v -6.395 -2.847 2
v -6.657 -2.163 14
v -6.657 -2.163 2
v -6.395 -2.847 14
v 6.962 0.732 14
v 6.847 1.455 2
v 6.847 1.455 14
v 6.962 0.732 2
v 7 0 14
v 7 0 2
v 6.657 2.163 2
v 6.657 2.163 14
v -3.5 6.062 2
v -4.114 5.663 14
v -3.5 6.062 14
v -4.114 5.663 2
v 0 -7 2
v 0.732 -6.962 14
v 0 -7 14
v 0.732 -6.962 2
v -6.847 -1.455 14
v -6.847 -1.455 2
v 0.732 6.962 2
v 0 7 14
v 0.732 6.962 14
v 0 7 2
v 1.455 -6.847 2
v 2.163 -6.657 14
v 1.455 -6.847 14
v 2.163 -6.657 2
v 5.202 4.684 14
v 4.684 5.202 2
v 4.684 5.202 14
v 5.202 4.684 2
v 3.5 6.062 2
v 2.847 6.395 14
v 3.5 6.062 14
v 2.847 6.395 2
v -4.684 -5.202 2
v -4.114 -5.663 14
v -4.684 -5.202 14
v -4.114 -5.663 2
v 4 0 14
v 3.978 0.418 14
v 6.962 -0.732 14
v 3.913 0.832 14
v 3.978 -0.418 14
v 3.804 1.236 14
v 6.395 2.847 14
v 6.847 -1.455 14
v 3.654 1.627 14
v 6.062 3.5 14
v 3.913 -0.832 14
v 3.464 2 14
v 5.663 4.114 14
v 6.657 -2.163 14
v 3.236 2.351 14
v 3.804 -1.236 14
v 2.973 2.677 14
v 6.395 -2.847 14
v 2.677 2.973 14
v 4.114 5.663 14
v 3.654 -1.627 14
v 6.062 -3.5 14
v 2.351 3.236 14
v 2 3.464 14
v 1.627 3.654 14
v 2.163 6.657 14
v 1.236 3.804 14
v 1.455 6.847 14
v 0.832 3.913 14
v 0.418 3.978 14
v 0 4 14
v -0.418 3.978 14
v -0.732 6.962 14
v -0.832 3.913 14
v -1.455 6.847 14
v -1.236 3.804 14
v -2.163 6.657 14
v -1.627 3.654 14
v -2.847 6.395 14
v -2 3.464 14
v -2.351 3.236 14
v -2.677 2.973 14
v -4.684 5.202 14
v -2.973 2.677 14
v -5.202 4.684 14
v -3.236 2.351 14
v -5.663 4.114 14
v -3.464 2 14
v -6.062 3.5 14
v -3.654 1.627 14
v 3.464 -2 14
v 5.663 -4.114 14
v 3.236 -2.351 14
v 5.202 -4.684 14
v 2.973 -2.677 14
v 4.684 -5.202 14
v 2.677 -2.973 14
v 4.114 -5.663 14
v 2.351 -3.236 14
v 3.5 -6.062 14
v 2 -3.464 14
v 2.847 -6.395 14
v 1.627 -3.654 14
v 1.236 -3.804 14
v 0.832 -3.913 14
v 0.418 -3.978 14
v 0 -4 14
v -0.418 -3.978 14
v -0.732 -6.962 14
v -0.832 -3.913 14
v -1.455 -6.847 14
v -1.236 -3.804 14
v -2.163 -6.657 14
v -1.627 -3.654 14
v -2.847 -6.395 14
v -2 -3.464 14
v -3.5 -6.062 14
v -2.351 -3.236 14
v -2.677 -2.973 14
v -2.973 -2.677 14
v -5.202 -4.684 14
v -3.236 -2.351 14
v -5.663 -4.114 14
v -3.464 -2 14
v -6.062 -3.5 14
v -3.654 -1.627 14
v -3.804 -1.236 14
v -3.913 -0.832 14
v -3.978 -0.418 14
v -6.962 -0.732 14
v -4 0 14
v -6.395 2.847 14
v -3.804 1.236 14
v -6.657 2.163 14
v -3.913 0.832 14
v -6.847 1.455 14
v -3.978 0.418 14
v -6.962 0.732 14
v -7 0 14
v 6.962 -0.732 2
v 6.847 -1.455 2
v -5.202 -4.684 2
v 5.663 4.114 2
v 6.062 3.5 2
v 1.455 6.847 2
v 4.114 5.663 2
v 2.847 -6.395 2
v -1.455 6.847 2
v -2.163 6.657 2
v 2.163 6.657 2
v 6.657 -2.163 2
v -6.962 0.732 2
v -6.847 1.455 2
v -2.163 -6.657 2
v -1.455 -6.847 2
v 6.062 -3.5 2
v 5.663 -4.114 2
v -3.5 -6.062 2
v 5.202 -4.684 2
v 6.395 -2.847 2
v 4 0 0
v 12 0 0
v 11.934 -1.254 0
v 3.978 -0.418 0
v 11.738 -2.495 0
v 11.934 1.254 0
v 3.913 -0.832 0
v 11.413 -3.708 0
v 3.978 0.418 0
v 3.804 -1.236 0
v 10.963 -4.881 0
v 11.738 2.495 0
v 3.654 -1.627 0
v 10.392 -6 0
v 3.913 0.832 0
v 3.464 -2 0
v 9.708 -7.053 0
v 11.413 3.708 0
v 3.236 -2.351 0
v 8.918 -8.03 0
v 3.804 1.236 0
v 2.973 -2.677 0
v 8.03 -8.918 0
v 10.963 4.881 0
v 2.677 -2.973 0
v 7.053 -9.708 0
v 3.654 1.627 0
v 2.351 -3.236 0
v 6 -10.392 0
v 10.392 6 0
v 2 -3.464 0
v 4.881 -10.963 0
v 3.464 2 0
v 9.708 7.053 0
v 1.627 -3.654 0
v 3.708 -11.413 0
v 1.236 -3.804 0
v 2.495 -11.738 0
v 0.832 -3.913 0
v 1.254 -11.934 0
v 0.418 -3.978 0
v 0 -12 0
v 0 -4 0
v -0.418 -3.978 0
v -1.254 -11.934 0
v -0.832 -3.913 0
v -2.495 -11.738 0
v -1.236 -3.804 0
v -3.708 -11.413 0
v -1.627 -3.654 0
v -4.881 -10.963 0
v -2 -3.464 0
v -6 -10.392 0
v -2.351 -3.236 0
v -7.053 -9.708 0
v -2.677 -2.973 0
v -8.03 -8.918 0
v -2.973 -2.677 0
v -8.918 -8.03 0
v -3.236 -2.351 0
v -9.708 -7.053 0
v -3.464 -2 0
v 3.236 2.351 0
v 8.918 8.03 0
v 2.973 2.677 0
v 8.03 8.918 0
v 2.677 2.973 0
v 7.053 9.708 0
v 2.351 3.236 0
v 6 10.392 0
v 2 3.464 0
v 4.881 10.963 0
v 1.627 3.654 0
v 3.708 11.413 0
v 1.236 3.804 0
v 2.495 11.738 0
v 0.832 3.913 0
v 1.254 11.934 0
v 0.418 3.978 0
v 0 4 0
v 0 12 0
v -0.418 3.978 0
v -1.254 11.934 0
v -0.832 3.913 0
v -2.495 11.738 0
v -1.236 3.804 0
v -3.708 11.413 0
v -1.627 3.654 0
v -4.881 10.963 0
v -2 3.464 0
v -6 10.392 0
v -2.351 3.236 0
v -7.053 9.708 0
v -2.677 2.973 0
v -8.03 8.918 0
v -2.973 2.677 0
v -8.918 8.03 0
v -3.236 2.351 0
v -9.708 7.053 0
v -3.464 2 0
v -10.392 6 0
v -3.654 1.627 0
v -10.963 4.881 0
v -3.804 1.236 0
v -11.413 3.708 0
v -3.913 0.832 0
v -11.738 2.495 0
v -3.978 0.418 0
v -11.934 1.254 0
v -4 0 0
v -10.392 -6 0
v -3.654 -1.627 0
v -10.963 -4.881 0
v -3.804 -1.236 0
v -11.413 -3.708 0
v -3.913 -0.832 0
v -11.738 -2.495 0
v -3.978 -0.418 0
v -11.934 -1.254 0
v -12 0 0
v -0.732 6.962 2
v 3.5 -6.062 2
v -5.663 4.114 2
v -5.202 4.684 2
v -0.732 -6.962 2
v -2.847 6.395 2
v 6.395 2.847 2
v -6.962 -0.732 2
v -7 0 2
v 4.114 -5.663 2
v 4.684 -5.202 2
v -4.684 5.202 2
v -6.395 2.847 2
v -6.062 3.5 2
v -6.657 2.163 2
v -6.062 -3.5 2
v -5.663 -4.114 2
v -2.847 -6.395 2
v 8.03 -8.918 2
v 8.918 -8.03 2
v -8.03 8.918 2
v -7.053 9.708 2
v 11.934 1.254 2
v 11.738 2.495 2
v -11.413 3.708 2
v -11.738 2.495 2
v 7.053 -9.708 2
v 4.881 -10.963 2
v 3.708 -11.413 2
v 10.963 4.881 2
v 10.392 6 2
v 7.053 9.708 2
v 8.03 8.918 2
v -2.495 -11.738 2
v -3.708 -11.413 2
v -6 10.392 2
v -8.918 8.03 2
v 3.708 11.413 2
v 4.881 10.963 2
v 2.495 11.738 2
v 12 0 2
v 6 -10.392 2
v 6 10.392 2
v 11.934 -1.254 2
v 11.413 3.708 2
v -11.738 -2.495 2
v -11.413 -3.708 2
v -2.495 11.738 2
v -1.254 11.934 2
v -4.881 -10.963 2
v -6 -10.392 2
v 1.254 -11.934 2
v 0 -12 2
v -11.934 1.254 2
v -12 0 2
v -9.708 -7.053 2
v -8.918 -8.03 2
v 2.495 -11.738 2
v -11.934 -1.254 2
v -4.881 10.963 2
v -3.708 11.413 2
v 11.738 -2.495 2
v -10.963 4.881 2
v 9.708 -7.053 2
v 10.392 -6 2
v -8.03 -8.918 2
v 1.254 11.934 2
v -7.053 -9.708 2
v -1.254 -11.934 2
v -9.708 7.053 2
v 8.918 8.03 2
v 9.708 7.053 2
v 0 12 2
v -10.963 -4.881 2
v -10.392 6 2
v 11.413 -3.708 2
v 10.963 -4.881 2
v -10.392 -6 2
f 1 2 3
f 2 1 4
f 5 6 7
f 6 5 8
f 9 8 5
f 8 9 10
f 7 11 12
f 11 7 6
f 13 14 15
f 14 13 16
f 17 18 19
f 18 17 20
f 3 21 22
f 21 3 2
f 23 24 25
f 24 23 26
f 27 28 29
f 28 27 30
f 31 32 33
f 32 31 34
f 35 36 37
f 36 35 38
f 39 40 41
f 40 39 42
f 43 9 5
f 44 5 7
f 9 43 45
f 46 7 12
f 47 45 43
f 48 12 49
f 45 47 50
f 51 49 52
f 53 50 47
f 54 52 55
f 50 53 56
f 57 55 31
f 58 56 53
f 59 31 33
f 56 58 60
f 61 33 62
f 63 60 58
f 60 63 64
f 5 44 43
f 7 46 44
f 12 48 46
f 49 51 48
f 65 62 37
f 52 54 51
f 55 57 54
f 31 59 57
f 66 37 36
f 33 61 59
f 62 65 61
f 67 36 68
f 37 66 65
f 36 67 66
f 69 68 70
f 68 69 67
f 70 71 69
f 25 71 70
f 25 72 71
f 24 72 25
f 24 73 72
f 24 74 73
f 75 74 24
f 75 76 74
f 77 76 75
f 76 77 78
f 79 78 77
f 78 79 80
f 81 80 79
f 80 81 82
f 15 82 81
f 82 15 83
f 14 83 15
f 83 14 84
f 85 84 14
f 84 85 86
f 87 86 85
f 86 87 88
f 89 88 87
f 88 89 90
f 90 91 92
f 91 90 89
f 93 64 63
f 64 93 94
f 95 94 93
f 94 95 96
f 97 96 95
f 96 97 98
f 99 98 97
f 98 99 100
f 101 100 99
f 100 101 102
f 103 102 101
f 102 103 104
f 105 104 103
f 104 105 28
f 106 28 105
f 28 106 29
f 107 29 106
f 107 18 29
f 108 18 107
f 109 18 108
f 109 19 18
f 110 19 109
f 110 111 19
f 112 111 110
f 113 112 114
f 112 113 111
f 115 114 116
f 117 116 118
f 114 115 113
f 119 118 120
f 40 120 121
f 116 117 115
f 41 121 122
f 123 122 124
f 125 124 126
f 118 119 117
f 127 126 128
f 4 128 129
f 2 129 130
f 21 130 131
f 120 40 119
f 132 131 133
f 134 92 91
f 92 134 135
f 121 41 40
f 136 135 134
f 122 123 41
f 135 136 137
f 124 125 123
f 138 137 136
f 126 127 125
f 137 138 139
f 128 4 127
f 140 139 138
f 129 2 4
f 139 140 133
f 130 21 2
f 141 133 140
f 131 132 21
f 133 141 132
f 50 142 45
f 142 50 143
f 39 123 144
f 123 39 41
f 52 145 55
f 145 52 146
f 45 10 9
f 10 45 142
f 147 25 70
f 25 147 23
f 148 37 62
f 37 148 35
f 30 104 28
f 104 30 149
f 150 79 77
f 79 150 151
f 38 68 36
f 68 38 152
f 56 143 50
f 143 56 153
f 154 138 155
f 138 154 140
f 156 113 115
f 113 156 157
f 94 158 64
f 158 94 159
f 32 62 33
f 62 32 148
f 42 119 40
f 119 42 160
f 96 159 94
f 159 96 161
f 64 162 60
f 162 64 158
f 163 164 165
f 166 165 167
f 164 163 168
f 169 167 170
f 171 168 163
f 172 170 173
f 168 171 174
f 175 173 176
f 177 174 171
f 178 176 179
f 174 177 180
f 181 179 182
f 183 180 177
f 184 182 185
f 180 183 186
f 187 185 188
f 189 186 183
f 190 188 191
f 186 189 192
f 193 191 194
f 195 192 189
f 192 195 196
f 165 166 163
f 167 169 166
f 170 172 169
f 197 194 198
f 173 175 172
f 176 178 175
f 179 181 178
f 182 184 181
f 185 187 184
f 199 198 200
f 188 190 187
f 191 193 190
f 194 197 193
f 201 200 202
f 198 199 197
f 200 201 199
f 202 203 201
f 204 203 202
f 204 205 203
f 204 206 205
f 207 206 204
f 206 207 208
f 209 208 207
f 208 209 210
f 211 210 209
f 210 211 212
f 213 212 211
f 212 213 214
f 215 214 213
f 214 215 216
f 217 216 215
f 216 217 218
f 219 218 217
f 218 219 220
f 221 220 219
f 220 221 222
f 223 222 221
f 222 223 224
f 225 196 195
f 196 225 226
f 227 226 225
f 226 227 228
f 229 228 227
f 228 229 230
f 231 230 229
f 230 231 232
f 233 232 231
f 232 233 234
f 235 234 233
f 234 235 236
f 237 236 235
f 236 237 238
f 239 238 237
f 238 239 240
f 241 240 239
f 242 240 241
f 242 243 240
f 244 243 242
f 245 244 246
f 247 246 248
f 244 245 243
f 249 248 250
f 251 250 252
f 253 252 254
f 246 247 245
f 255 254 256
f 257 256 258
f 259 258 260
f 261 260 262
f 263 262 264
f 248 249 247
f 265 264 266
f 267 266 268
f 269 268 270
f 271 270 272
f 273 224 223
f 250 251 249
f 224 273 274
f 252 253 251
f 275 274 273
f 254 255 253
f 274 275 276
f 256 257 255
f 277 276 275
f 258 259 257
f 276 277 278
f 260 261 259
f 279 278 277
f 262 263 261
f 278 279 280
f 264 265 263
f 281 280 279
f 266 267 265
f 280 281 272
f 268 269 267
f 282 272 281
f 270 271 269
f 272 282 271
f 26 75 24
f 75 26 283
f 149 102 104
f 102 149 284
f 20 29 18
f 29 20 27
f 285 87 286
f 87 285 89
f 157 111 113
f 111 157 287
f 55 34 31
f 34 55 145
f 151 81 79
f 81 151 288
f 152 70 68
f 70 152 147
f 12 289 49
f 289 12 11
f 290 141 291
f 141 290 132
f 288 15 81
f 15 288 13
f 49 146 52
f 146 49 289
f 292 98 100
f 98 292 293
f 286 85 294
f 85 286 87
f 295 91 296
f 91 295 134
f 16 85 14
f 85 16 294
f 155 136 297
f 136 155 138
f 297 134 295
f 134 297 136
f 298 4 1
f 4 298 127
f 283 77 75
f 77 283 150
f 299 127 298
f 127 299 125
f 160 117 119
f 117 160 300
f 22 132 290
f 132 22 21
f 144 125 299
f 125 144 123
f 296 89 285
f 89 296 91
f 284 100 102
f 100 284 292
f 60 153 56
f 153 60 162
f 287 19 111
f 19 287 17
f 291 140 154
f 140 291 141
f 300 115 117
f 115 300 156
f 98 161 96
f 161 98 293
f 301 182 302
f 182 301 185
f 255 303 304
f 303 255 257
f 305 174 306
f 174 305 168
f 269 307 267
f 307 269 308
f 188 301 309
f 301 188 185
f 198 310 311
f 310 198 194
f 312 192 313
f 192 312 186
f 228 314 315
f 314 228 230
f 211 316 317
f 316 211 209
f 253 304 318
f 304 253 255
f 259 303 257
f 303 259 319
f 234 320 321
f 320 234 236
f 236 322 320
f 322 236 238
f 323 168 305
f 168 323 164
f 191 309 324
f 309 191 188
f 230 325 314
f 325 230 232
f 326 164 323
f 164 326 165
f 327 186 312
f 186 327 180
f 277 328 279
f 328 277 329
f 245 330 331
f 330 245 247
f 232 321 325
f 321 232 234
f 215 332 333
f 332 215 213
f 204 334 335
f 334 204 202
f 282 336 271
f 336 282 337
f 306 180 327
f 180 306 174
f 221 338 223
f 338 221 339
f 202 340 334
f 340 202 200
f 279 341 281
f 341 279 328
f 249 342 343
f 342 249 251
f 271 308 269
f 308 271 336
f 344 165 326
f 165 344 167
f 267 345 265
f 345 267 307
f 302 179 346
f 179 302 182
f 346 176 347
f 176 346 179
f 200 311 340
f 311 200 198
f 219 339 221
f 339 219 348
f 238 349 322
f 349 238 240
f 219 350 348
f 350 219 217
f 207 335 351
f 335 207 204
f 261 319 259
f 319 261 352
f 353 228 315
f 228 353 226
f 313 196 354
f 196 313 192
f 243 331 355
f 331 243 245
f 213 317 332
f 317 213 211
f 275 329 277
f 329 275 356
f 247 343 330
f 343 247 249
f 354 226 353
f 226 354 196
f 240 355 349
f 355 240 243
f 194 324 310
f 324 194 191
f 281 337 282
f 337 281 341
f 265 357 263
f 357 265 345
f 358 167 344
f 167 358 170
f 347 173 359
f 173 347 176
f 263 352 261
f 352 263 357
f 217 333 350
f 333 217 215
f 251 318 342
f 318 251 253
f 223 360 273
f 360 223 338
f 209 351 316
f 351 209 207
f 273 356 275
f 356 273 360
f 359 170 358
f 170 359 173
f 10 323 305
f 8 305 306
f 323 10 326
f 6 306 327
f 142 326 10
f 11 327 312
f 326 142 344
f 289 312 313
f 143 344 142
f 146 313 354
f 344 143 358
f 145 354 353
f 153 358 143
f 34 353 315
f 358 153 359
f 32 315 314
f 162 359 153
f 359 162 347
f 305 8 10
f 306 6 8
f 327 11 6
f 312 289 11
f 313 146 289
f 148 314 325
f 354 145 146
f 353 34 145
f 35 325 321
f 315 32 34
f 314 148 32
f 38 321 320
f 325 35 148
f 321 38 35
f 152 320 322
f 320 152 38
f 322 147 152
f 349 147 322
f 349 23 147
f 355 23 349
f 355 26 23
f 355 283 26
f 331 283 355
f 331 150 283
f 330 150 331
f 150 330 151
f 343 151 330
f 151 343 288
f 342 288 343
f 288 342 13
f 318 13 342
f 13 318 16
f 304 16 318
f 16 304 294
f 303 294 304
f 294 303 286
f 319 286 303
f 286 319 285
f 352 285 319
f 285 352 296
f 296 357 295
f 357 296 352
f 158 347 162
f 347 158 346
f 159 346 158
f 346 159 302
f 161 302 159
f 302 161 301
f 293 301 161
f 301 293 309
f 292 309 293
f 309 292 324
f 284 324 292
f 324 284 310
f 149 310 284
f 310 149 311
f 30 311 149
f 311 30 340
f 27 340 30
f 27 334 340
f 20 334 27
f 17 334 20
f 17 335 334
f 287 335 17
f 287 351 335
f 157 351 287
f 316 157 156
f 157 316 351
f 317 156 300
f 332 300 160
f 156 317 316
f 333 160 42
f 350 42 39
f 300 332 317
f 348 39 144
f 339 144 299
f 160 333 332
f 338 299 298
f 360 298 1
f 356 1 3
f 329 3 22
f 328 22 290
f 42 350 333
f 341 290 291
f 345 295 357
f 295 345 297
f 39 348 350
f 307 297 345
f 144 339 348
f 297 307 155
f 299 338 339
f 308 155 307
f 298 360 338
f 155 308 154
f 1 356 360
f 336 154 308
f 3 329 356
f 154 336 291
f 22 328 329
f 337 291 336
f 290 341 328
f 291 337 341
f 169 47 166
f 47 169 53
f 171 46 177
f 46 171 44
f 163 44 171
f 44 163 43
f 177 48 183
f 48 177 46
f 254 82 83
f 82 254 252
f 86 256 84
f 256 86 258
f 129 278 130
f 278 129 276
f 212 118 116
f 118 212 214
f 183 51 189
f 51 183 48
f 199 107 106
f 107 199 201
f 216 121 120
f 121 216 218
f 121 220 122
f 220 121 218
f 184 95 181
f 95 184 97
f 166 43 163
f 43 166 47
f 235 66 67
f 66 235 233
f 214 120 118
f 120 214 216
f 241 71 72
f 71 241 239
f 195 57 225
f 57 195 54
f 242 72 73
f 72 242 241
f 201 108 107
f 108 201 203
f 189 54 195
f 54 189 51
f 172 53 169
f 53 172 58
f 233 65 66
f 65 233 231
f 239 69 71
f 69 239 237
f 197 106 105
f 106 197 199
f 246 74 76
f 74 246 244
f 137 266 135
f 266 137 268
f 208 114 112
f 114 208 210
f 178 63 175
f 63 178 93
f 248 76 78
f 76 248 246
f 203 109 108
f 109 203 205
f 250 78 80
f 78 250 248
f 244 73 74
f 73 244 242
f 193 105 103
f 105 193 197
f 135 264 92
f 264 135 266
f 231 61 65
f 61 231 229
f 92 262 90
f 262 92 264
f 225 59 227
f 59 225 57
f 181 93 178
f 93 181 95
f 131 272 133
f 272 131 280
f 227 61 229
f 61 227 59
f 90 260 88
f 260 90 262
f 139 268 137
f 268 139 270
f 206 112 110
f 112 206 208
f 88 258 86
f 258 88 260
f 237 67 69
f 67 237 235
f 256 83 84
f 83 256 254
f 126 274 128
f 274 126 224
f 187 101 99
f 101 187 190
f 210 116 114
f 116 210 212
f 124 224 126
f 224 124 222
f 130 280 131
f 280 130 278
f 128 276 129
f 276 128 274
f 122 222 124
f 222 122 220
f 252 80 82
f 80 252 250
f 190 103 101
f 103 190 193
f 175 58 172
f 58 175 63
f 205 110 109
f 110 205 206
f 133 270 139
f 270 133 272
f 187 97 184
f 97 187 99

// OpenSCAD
// Flanged spacer.
$fn = 60;
eps = 0.02;
inner_d = 8;
outer_d = 14;
length = 14;
flange_d = 24;
difference() { union() { cylinder(d=outer_d,h=length); cylinder(d=flange_d,h=2); } translate([0,0,-eps]) cylinder(d=inner_d,h=length+2*eps); }
